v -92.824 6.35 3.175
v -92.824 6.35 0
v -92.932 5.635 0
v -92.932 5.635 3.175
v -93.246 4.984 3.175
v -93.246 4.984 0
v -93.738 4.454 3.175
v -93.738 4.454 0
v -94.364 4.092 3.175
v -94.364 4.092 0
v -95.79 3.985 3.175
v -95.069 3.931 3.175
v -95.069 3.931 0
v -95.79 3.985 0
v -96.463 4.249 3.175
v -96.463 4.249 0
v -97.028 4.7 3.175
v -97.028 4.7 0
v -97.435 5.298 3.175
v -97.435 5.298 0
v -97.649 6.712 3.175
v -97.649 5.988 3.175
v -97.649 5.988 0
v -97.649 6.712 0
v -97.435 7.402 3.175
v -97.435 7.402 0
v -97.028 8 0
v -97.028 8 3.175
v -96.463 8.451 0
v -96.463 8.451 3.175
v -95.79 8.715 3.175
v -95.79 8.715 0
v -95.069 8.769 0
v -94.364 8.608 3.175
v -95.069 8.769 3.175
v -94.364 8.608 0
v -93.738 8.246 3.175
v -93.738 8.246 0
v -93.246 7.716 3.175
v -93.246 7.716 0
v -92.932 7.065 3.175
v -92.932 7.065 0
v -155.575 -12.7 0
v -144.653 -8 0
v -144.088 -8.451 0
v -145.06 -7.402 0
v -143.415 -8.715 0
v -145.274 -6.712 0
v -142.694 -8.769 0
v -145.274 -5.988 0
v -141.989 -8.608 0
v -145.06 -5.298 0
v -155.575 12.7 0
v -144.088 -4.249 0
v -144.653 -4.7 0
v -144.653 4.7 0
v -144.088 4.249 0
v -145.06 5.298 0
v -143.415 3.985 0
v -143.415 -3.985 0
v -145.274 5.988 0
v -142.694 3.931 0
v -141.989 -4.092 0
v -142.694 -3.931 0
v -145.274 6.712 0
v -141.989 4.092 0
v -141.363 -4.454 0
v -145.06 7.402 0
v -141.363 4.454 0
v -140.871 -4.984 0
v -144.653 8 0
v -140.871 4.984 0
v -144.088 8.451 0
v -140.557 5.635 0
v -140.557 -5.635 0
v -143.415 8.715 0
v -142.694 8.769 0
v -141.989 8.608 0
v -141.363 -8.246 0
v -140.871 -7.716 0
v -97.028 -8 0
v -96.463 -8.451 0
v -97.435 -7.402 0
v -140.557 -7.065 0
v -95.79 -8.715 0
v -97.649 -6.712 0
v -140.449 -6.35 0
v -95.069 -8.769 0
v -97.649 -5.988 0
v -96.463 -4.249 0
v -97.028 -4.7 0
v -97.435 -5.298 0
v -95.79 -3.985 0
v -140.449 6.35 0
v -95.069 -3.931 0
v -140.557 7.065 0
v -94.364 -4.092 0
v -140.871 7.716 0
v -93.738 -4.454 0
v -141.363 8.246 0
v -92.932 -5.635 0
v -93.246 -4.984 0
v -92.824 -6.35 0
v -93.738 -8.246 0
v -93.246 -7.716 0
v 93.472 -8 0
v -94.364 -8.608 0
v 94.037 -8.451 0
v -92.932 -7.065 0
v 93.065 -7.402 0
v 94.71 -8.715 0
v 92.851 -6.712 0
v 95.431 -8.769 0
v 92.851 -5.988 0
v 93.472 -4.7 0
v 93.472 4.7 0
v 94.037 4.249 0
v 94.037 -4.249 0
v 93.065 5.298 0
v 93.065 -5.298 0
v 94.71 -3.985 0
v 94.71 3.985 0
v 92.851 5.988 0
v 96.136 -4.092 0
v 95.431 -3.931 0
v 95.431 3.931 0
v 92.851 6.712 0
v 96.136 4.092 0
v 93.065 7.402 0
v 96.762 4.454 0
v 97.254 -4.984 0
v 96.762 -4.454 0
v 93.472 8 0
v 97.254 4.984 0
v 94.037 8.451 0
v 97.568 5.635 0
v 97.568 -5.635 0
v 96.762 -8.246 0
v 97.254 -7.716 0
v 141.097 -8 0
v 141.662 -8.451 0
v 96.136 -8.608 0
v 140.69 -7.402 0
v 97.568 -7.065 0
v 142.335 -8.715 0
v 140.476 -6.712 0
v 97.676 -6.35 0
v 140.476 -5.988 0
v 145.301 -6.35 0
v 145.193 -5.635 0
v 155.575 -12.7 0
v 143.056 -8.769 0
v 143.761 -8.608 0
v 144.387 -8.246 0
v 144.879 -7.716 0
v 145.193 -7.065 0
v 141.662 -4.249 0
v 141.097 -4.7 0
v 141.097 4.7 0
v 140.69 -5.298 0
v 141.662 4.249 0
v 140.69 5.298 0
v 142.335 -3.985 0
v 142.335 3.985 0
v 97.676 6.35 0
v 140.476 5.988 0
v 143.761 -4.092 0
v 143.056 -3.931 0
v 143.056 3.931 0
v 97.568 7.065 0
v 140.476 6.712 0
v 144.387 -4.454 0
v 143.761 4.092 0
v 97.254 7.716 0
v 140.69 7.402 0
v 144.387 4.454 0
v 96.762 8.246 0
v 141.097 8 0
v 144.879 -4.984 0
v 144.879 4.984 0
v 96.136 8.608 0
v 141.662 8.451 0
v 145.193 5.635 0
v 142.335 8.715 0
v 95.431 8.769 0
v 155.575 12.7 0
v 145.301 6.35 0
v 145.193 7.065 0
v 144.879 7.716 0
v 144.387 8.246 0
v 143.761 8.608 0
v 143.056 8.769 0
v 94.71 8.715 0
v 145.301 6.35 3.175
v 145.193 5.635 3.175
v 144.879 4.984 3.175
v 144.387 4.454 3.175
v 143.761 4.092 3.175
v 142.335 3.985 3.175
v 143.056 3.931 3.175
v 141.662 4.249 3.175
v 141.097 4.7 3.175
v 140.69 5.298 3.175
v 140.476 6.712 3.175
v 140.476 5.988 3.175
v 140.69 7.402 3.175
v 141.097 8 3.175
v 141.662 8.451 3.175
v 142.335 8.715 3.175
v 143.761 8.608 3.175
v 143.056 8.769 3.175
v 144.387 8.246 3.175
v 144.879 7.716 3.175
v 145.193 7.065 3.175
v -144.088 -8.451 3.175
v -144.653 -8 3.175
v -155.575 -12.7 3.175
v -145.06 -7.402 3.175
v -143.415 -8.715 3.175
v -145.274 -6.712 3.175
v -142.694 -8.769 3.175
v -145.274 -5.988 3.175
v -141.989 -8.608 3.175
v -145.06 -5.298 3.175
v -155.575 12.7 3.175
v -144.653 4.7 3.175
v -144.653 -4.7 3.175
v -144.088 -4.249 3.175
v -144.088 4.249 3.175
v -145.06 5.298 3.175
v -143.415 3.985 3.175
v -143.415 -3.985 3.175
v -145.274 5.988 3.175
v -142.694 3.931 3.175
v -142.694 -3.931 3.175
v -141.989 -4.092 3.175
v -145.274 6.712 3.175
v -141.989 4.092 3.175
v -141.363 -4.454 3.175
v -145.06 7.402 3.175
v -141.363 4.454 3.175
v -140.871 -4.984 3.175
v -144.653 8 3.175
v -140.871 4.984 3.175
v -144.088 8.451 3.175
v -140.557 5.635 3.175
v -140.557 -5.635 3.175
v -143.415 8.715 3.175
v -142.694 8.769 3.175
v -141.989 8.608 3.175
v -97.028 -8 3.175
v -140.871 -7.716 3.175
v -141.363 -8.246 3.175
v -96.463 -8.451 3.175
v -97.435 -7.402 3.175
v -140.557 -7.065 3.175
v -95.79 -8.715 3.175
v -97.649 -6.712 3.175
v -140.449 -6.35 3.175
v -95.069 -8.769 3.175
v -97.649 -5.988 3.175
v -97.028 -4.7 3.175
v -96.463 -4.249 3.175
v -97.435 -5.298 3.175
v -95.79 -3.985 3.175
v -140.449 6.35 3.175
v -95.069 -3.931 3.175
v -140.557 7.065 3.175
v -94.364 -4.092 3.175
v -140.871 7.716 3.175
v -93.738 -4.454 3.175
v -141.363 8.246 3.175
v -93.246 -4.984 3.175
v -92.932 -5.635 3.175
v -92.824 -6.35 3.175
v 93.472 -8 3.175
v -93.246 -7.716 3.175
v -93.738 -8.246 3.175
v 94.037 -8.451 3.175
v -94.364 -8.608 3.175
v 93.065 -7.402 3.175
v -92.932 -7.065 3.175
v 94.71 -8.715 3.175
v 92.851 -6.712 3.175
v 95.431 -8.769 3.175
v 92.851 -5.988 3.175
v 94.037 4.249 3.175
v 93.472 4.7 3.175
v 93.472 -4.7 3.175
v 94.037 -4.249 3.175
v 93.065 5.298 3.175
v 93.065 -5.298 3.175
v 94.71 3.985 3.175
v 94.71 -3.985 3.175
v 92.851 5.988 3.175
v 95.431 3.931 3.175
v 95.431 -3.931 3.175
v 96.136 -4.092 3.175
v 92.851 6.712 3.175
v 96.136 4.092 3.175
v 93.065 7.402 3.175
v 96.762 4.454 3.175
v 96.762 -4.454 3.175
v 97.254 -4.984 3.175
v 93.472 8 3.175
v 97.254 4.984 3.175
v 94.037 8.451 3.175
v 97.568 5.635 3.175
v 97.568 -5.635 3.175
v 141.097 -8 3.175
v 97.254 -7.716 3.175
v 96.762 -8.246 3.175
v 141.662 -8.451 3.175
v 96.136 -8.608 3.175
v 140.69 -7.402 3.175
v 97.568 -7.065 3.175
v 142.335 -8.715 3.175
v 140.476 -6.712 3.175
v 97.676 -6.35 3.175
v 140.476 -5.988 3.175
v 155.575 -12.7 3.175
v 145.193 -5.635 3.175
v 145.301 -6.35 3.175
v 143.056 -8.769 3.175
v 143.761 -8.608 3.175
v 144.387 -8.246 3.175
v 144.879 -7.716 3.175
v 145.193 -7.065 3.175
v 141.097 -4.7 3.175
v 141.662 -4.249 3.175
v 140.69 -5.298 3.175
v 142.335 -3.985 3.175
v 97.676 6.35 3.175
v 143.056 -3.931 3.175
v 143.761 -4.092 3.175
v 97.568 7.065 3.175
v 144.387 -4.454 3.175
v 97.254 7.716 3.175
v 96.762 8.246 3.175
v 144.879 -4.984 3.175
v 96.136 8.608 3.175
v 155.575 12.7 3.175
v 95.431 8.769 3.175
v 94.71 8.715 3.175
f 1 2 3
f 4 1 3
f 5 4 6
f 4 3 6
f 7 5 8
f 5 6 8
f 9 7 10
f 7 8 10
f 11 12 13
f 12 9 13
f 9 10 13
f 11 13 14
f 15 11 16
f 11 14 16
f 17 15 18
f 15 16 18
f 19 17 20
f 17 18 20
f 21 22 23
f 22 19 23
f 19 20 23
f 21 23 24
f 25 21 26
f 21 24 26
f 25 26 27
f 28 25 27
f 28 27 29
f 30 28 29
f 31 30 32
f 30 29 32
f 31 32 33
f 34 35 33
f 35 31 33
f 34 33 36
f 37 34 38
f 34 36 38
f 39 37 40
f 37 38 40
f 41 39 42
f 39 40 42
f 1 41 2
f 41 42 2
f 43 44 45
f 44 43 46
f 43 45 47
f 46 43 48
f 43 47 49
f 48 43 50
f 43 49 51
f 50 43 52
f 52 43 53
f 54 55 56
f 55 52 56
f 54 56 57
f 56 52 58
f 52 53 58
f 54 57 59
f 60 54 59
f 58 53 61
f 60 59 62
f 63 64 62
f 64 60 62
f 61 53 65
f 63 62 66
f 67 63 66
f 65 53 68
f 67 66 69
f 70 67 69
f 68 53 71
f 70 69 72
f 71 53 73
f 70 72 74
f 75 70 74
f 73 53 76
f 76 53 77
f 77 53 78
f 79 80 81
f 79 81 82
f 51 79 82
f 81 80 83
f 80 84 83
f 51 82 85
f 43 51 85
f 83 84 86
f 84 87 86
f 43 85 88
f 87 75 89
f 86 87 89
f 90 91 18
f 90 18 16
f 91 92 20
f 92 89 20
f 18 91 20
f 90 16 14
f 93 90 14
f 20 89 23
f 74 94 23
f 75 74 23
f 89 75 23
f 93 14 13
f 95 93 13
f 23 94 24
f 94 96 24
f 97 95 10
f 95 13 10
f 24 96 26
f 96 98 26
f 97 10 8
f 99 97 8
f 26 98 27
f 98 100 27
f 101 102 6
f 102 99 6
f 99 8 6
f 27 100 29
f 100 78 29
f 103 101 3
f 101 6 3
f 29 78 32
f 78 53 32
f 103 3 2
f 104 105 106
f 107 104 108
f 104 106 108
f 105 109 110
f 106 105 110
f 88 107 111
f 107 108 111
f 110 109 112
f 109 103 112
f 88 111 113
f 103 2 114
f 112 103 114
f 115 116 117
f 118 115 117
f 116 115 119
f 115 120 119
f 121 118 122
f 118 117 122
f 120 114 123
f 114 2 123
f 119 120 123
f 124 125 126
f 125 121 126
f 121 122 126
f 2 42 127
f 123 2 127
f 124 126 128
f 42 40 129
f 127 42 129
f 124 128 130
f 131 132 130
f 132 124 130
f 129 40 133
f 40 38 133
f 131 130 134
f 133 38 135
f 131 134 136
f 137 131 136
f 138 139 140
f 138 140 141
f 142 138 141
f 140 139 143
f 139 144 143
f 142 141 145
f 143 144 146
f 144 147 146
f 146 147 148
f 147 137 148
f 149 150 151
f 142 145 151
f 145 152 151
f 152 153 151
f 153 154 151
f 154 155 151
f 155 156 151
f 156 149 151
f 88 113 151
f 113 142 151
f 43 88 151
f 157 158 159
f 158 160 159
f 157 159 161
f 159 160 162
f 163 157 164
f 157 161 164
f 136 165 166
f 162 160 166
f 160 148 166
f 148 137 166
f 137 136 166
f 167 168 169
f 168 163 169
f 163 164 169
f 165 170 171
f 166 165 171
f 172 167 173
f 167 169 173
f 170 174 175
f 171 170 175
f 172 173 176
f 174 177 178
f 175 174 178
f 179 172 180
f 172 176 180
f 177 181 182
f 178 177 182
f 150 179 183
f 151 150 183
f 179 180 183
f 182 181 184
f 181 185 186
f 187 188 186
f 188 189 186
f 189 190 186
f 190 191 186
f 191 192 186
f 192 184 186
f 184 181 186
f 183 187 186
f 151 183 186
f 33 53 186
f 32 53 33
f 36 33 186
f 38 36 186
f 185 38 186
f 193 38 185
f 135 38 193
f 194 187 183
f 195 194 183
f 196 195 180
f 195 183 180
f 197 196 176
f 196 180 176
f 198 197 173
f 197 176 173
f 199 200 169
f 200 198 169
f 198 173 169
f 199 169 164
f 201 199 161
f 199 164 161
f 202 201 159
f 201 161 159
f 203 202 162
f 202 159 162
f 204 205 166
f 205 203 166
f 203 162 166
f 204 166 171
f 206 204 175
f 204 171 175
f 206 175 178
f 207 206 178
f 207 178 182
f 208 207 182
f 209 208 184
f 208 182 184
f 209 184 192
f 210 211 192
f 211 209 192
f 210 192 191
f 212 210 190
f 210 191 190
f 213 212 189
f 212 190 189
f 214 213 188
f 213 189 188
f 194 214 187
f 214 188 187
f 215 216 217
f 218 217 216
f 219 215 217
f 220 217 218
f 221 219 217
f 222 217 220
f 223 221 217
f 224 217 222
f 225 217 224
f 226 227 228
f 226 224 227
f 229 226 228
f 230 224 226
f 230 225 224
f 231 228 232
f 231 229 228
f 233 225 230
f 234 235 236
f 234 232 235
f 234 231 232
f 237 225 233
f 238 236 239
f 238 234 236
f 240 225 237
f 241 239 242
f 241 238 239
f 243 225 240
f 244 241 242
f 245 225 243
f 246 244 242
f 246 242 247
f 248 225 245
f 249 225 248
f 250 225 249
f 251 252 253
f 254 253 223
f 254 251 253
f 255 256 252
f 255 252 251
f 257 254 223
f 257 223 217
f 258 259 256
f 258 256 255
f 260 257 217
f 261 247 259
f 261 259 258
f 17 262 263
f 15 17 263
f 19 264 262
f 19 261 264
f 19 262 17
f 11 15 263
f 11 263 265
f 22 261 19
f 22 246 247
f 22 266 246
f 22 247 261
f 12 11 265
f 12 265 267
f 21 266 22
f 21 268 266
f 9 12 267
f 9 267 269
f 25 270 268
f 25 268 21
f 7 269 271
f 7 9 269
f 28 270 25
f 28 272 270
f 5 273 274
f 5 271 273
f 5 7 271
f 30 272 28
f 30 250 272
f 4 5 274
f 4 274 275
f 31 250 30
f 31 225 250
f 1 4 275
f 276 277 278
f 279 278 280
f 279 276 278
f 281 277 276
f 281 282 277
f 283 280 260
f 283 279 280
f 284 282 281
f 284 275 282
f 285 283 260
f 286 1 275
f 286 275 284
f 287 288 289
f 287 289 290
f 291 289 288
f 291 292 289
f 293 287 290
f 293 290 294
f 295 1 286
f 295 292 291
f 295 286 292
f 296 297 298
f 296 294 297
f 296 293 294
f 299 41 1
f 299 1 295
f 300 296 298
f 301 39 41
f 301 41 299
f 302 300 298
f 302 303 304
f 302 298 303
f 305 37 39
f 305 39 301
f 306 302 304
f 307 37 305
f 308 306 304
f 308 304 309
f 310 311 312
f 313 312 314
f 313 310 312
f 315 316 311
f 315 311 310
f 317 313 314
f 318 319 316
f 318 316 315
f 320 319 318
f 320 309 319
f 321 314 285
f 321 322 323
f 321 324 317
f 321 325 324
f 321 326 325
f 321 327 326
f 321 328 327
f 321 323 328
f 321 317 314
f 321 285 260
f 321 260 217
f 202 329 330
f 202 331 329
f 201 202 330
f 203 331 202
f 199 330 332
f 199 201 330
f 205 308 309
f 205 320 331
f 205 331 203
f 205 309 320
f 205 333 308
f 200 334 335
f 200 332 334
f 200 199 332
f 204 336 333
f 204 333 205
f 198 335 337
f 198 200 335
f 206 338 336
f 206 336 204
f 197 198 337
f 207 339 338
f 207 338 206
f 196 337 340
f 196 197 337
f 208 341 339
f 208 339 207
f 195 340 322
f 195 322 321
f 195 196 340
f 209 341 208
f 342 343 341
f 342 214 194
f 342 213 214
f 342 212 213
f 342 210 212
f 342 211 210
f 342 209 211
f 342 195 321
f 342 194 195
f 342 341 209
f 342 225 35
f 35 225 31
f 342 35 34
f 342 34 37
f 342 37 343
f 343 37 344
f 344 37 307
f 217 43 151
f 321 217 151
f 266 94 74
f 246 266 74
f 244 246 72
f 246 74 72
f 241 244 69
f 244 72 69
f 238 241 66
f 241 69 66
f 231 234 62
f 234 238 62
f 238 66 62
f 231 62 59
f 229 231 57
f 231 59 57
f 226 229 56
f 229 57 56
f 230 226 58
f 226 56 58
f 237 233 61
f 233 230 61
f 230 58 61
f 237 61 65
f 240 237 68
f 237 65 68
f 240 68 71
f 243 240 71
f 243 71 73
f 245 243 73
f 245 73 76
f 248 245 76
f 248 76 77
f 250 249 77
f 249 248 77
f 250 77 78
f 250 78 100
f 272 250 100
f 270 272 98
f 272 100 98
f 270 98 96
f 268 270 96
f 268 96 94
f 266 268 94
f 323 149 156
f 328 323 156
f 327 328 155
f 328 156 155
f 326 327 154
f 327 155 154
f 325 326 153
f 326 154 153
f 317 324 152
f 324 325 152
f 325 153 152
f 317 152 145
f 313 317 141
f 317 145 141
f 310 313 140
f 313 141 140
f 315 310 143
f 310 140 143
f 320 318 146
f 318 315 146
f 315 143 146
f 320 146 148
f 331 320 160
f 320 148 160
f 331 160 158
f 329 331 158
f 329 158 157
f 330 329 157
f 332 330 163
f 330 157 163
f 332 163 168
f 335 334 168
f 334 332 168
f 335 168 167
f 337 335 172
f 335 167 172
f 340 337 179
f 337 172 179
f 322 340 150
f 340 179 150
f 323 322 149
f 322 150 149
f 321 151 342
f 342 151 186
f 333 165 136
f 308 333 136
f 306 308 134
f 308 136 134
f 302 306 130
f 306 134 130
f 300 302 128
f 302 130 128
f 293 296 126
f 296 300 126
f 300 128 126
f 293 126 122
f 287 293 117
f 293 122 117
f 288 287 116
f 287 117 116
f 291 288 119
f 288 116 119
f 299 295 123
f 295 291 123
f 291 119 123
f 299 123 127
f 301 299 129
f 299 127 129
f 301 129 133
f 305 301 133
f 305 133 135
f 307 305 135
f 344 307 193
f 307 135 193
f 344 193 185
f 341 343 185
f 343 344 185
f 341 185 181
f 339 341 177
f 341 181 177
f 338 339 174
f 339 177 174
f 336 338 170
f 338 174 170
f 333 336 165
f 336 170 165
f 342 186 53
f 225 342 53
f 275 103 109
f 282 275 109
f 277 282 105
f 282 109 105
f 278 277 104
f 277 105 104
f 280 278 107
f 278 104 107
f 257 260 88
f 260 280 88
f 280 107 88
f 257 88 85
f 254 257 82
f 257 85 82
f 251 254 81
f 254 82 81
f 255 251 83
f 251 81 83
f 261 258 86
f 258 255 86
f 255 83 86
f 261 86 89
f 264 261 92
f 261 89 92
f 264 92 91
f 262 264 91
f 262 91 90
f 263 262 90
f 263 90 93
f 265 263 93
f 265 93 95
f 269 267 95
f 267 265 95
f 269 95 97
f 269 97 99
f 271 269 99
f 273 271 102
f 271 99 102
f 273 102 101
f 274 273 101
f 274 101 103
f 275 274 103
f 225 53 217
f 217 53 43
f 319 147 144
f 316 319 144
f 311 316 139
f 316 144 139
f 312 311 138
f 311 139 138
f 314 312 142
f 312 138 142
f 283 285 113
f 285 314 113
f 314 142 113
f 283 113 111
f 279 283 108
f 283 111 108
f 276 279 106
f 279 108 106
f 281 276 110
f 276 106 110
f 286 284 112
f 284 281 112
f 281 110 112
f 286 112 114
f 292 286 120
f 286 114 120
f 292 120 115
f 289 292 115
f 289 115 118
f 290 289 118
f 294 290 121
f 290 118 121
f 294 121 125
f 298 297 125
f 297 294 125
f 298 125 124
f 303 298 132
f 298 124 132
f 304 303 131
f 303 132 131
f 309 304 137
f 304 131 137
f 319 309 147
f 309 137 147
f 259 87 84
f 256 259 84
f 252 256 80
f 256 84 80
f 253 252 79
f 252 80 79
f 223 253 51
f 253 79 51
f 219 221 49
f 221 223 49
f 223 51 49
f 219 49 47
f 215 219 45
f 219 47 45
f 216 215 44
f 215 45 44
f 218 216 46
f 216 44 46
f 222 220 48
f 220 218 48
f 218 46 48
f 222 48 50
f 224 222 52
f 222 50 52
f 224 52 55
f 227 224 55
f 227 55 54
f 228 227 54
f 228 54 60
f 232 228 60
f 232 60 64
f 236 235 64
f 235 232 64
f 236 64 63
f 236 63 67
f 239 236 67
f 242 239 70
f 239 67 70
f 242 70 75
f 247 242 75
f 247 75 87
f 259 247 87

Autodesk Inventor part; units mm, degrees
ref_plane "YZ Plane" through (0, 0, 0) normal (1, 0, 0) x (0, 1, 0)
ref_plane "XZ Plane" through (0, 0, 0) normal (0, 1, 0) x (-1, 0, 0)
ref_plane "XY Plane" through (0, 0, 0) normal (0, 0, 1) x (1, 0, 0)
sketch "Sketch1" plane through (0, 0, 0) normal (0, 0, 1) x (1, 0, 0)
  line L0 (155.575, 12.7) -> (-155.575, 12.7)
  line L1 (-155.575, 12.7) -> (-155.575, -12.7)
  line L2 (-155.575, -12.7) -> (155.575, -12.7)
  line L3 (155.575, -12.7) -> (155.575, 12.7)
  line L4 (155.575, 12.7) -> (-155.575, -12.7) construction
  line L5 (-155.575, 12.7) -> (155.575, -12.7) construction
  line L6 (-149.225, 12.7) -> (-136.525, 12.7)
  line L7 (-136.525, 12.7) -> (-136.525, -12.7)
  line L8 (-136.525, -12.7) -> (-149.225, -12.7)
  line L9 (-149.225, -12.7) -> (-149.225, 12.7)
  circle A0 centre (-142.875, 6.35) radius 2.4257
  circle A1 centre (-142.875, -6.35) radius 2.4257
  line L10 (149.225, 12.7) -> (136.525, 12.7)
  line L11 (136.525, 12.7) -> (136.525, -12.7)
  line L12 (136.525, -12.7) -> (149.225, -12.7)
  line L13 (149.225, -12.7) -> (149.225, 12.7)
  circle A2 centre (142.875, 6.35) radius 2.4257
  circle A3 centre (142.875, -6.35) radius 2.4257
  line L14 (101.6, 12.7) -> (88.9, 12.7)
  line L15 (88.9, 12.7) -> (88.9, -12.7)
  line L16 (88.9, -12.7) -> (101.6, -12.7)
  line L17 (101.6, -12.7) -> (101.6, 12.7)
  line L18 (-101.6, 12.7) -> (-88.9, 12.7)
  line L19 (-88.9, 12.7) -> (-88.9, -12.7)
  line L20 (-88.9, -12.7) -> (-101.6, -12.7)
  line L21 (-101.6, -12.7) -> (-101.6, 12.7)
  circle A4 centre (-95.25, 6.35) radius 2.4257
  circle A5 centre (-95.25, -6.35) radius 2.4257
  circle A6 centre (95.25, -6.35) radius 2.4257
  circle A7 centre (95.25, 6.35) radius 2.4257
  point P0 (0, 0)
  point P1 (149.225, 0)
  dimension "d0" = 311.15
  dimension "d1" = 25.4
  dimension "d2" = 12.7
  dimension "d3" = 6.35
  dimension "d4" = 4.8514
  dimension "d5" = 4.8514
  dimension "d6" = 6.35
  dimension "d7" = 6.35
  dimension "d8" = 12.7
  dimension "d9" = 6.35
  dimension "d10" = 4.8514
  dimension "d11" = 4.8514
  dimension "d12" = 12.7
  dimension "d13" = 47.625
  dimension "d14" = 12.7
  dimension "d15" = 47.625
  dimension "d16" = 4.8514
  dimension "d17" = 4.8514
  dimension "d18" = 4.8514
  dimension "d19" = 4.8514
  dimension "d22" = 6.35
  dimension "d23" = 6.35
  dimension "d24" = 6.35
  dimension "d25" = 6.35
  dimension "d26" = 6.35
  dimension "d27" = 6.35
  dimension "d28" = 6.35
  dimension "d29" = 6.35
extrude "Extrusion1" add sketch "Sketch1" along normal blind 3.175
properties part number "Chassis Bar" material "Stainless Steel"
